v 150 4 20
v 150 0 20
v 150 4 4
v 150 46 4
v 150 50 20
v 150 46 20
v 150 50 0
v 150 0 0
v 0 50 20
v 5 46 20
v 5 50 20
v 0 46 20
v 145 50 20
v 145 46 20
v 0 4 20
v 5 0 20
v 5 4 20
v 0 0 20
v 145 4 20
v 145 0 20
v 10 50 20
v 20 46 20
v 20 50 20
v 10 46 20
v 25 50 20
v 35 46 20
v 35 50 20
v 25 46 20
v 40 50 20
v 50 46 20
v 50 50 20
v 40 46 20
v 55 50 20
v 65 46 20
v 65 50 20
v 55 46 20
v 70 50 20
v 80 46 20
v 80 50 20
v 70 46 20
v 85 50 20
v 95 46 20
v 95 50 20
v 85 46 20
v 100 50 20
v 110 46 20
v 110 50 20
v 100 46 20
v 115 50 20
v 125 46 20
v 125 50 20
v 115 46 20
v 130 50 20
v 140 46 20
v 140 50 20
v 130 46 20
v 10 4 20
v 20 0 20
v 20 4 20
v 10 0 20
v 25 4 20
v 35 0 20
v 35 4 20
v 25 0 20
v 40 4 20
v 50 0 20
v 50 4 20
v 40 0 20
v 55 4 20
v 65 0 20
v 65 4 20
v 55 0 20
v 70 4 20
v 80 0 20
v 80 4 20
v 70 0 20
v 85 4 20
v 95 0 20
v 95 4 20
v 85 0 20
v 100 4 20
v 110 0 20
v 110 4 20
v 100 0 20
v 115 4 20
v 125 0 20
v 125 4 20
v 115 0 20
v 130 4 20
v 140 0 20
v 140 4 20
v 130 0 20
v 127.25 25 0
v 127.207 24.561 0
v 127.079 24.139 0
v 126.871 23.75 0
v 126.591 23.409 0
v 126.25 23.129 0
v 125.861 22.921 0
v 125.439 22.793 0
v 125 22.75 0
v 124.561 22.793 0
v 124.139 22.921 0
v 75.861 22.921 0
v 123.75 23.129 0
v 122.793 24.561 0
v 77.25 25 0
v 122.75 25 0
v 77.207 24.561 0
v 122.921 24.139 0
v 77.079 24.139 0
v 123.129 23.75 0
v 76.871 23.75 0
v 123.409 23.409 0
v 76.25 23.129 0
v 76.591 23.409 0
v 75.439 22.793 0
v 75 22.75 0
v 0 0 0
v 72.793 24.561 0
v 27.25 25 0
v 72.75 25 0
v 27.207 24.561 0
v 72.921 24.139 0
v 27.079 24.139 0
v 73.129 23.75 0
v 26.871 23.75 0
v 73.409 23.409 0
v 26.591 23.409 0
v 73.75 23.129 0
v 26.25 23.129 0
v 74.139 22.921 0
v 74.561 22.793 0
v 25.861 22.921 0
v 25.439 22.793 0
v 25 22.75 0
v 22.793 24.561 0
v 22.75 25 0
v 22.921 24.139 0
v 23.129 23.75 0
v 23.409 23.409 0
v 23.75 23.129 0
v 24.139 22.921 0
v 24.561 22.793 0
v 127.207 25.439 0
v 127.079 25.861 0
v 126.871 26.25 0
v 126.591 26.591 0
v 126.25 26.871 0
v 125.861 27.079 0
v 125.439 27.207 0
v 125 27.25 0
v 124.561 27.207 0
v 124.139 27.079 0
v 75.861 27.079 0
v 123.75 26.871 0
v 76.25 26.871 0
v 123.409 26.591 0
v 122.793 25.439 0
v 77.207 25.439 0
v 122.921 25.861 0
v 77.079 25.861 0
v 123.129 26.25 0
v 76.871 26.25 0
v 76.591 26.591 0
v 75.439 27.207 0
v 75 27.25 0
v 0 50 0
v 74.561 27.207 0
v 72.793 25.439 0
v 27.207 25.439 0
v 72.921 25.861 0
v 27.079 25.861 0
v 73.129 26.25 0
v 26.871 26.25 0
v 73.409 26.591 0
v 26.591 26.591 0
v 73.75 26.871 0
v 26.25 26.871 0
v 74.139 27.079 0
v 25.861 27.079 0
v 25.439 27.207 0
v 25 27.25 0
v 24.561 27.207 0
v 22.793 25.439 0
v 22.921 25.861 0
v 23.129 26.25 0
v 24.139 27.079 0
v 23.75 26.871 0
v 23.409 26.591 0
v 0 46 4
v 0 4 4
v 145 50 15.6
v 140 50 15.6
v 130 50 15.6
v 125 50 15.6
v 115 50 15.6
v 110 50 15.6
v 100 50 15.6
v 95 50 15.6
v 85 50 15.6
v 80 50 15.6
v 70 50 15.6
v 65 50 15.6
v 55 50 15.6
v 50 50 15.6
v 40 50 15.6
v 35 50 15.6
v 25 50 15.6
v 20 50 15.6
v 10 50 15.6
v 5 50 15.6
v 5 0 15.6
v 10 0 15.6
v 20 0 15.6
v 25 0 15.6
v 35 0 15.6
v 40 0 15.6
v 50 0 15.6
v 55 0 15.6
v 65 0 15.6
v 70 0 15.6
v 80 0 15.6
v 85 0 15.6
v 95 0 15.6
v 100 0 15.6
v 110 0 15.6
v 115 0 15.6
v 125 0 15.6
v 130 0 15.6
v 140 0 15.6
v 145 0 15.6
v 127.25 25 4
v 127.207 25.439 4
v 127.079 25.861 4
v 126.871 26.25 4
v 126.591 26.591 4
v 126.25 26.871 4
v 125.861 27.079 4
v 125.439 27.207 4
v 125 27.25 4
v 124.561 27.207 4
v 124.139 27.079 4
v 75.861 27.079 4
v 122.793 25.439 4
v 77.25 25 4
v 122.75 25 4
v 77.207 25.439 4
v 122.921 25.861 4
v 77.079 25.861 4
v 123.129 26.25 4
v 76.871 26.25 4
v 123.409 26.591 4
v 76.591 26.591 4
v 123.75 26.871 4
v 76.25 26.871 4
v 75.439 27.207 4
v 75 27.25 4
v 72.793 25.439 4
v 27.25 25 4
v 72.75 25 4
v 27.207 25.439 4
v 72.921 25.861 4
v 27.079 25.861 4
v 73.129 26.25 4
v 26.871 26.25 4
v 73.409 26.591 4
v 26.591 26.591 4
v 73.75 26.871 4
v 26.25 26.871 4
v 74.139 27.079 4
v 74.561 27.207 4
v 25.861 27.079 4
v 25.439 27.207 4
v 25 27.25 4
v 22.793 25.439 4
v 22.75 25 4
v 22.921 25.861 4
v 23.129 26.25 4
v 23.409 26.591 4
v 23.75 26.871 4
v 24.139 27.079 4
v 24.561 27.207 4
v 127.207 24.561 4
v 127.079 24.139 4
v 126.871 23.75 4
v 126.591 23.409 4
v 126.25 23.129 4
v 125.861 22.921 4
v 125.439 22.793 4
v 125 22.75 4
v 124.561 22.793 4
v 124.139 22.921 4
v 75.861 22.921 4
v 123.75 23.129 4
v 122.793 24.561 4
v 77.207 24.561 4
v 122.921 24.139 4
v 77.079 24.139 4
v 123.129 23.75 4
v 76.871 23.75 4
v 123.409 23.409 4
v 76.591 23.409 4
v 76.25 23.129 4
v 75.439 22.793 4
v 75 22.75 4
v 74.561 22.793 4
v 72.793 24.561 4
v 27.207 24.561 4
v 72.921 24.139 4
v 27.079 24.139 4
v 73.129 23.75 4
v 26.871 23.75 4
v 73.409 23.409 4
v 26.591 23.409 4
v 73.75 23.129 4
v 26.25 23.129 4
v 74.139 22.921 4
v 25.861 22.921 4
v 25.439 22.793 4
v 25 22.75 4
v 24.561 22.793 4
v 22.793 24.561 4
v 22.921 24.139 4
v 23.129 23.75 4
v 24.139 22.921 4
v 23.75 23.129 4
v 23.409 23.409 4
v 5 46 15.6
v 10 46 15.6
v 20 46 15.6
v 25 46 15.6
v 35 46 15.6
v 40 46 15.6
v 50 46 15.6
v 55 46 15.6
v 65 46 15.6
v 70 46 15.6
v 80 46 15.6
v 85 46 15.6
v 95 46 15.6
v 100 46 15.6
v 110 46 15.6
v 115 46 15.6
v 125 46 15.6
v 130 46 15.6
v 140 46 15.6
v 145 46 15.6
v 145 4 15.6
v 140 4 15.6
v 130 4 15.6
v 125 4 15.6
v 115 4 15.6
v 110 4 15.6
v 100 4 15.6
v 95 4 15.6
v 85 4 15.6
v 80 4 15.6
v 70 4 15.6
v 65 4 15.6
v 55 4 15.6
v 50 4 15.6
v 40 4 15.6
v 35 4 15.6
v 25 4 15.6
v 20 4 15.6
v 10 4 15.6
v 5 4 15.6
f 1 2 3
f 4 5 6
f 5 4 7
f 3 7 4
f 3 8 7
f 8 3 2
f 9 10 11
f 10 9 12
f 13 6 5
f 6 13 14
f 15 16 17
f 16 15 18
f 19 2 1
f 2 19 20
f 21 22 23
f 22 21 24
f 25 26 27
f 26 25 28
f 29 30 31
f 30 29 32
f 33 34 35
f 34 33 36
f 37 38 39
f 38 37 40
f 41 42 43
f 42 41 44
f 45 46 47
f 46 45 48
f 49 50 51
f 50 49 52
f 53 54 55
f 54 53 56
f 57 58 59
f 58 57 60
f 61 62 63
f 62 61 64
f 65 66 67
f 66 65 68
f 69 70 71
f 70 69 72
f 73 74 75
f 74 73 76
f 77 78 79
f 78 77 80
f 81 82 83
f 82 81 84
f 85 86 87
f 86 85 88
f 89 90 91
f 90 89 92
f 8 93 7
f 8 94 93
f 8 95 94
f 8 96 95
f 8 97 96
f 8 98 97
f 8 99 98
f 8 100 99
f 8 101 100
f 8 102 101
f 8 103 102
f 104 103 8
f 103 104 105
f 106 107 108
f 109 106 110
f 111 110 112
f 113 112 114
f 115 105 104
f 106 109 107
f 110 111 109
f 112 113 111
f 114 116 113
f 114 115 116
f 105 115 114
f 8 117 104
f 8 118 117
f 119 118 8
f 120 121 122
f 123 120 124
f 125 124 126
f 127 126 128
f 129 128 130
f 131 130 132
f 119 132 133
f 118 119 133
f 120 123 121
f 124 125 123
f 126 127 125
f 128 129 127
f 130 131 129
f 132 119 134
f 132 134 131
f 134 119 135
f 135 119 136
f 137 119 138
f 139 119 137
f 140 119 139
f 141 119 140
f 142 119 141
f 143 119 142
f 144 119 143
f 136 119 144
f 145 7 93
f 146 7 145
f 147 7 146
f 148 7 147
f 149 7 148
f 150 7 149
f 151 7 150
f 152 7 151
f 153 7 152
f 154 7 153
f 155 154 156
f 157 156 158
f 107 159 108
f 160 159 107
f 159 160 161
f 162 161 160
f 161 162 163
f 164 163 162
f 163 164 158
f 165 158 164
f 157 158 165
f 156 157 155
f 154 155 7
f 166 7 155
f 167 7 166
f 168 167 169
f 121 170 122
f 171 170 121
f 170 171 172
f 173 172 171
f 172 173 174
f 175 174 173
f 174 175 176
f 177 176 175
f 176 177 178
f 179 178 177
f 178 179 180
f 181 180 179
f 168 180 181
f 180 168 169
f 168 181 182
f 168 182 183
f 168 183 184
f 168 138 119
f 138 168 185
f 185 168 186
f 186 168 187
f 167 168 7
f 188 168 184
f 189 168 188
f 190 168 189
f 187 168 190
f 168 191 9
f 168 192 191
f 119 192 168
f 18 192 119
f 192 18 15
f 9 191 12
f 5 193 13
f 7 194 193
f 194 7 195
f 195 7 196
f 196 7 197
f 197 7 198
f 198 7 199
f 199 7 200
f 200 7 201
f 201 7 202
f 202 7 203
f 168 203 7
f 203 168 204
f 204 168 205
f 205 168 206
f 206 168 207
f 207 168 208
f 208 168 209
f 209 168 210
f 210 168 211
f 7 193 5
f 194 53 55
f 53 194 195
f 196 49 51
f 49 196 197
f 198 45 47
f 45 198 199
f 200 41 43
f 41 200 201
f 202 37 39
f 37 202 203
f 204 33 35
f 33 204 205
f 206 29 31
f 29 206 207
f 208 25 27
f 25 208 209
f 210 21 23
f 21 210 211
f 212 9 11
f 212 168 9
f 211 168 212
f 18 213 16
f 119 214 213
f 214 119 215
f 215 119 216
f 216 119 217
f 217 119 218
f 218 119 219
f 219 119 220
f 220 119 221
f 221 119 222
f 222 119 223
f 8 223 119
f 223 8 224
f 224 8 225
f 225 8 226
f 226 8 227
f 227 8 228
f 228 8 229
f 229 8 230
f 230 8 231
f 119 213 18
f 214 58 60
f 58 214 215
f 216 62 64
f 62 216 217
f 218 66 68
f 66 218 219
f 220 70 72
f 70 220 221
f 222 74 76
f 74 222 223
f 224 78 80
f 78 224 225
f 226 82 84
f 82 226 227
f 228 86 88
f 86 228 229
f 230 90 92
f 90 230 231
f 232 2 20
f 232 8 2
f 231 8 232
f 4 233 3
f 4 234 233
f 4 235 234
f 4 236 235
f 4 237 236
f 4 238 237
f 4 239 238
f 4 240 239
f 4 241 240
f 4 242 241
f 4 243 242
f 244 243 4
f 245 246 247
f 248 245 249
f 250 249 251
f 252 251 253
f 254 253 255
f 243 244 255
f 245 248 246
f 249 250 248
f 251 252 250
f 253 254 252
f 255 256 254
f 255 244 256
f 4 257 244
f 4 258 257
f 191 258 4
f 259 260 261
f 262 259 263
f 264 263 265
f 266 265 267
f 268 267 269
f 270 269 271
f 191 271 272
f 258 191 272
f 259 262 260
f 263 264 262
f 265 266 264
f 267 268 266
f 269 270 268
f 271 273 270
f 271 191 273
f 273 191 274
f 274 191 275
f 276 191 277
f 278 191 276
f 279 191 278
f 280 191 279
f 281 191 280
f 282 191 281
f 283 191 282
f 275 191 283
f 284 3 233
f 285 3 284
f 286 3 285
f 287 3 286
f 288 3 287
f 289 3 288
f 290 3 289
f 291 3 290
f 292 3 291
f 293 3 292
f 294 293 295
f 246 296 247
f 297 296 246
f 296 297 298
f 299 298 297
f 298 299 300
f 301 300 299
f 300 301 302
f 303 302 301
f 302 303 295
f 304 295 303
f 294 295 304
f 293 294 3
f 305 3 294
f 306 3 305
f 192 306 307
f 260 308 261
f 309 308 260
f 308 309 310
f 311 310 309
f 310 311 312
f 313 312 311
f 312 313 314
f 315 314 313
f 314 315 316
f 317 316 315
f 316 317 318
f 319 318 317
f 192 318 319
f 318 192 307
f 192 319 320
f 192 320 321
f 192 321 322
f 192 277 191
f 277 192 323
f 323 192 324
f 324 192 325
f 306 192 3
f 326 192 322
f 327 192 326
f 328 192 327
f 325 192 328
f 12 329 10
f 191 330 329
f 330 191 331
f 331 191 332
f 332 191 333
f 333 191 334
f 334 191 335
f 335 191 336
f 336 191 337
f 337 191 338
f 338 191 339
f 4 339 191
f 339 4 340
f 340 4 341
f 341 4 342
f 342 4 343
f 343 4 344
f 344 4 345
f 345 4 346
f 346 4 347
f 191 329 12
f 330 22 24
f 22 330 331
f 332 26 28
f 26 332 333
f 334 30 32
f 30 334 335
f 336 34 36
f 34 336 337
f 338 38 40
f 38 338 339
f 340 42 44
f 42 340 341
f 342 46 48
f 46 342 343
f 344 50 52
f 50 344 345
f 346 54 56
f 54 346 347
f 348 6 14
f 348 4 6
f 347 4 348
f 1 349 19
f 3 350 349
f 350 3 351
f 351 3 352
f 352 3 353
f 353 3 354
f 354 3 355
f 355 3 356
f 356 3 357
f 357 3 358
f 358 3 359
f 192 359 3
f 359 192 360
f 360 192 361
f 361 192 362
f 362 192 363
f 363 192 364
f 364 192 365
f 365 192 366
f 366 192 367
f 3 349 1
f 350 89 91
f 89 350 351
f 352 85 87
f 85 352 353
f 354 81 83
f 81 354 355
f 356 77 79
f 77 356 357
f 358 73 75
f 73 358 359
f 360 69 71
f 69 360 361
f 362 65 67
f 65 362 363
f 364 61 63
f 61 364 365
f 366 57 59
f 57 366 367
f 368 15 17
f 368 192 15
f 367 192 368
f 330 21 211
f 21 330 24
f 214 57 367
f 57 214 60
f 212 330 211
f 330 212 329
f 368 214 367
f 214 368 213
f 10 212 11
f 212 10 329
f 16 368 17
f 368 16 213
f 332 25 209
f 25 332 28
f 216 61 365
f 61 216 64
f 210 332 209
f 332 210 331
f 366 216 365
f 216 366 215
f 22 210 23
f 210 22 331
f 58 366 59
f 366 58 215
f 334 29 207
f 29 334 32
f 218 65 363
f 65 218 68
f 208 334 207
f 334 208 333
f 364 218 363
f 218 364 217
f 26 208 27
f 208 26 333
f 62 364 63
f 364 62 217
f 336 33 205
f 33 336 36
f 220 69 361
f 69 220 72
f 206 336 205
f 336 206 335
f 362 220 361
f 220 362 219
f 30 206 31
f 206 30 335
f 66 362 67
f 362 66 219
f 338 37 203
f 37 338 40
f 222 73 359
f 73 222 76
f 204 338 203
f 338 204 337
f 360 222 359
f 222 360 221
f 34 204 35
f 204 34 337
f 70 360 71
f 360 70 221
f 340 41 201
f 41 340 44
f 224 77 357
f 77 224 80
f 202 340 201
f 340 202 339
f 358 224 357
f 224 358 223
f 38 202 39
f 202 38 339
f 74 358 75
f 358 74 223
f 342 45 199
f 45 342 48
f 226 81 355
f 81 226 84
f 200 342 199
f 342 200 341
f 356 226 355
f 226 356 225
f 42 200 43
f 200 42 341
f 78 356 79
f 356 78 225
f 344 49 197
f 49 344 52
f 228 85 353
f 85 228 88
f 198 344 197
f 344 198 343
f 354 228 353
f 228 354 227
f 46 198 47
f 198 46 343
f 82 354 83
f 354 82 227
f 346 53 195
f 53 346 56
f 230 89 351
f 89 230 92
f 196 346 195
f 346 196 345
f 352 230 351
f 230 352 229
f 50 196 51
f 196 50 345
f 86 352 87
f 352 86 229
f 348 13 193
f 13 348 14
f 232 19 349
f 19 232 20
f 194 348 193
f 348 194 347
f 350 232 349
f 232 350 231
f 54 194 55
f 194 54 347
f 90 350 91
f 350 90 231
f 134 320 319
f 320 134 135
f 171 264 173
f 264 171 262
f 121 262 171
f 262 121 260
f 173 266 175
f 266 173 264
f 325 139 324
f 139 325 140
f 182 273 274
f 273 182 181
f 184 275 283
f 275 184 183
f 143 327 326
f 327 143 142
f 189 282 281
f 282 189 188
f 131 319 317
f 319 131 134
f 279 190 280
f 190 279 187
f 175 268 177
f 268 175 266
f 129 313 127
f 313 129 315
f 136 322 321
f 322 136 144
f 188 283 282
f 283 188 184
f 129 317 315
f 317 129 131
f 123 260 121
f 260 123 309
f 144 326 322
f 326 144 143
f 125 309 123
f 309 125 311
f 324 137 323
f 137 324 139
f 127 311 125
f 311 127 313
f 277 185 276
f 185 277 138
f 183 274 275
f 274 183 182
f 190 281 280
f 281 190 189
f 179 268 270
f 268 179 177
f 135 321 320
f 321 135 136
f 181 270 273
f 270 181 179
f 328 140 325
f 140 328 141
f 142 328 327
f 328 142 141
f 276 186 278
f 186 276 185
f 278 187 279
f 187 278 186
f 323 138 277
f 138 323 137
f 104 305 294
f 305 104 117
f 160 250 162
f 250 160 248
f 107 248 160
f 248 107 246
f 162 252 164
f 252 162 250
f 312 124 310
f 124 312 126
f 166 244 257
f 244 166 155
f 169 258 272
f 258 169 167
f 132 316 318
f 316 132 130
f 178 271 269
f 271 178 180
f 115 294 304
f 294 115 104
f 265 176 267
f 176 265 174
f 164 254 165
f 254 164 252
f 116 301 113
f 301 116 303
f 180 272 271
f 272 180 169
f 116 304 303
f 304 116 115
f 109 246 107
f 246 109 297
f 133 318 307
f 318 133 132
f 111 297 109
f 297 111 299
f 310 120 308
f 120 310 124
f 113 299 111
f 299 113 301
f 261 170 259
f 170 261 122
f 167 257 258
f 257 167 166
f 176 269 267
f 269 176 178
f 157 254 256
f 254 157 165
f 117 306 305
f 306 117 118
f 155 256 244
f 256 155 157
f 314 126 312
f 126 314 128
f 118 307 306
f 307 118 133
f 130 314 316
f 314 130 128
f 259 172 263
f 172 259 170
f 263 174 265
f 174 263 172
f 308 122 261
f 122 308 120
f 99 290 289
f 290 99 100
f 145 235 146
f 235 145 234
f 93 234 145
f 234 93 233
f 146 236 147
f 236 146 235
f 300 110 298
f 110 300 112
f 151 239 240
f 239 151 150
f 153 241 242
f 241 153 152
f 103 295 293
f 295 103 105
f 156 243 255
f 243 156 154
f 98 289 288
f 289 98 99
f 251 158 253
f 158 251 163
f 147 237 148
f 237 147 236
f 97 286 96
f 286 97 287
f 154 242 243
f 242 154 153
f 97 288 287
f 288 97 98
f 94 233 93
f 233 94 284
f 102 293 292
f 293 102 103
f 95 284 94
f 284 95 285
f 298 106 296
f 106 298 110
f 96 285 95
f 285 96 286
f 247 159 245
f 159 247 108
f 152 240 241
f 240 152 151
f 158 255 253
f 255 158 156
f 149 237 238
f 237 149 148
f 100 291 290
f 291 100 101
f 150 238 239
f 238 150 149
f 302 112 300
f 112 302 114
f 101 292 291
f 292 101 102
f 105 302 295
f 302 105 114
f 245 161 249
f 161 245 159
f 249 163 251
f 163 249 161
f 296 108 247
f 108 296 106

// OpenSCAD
$fn = 32;

// ----------------------------------------------------------------------
// Cable duct: 150 x 50 x 20 mm, 10 fingers
// ----------------------------------------------------------------------

// --- parameters (mm) ---
channel_l = 150;          // duct length, X
channel_w = 50;           // duct width, Y
channel_h = 20;           // duct height, Z
channel_t = 4;            // side wall thickness
floor_t = 4;              // floor thickness
slot_w = 5;               // finger slot width
slot_h = 11.6;            // finger slot height
fingers = 10;             // number of finger slots per side
pitch = 15;               // finger pitch
hole_d = 4.5;             // floor mounting hole
hole_n = 3;               // mounting holes in the floor

module shell() {
  difference() {
    cube([channel_l, channel_w, channel_h]);
    /* open top channel */
    translate([-channel_t - 1, channel_t, floor_t])
      cube([channel_l + 2 * channel_t + 2, channel_w - 2 * channel_t, channel_h + 1]);
  }
}

difference() {
  union() {
    shell();
  }
  /* finger slots cut through both side walls */
  for (i = [0 : fingers - 1]) translate([pitch / 2 + i * pitch - slot_w / 2, -1, floor_t + slot_h]) cube([slot_w, channel_w + 2, channel_h]);
  for (i = [0 : hole_n - 1]) translate([(channel_l / hole_n) * (i + 0.5), channel_w / 2, -1]) cylinder(h = floor_t + 2, d = hole_d);
}
